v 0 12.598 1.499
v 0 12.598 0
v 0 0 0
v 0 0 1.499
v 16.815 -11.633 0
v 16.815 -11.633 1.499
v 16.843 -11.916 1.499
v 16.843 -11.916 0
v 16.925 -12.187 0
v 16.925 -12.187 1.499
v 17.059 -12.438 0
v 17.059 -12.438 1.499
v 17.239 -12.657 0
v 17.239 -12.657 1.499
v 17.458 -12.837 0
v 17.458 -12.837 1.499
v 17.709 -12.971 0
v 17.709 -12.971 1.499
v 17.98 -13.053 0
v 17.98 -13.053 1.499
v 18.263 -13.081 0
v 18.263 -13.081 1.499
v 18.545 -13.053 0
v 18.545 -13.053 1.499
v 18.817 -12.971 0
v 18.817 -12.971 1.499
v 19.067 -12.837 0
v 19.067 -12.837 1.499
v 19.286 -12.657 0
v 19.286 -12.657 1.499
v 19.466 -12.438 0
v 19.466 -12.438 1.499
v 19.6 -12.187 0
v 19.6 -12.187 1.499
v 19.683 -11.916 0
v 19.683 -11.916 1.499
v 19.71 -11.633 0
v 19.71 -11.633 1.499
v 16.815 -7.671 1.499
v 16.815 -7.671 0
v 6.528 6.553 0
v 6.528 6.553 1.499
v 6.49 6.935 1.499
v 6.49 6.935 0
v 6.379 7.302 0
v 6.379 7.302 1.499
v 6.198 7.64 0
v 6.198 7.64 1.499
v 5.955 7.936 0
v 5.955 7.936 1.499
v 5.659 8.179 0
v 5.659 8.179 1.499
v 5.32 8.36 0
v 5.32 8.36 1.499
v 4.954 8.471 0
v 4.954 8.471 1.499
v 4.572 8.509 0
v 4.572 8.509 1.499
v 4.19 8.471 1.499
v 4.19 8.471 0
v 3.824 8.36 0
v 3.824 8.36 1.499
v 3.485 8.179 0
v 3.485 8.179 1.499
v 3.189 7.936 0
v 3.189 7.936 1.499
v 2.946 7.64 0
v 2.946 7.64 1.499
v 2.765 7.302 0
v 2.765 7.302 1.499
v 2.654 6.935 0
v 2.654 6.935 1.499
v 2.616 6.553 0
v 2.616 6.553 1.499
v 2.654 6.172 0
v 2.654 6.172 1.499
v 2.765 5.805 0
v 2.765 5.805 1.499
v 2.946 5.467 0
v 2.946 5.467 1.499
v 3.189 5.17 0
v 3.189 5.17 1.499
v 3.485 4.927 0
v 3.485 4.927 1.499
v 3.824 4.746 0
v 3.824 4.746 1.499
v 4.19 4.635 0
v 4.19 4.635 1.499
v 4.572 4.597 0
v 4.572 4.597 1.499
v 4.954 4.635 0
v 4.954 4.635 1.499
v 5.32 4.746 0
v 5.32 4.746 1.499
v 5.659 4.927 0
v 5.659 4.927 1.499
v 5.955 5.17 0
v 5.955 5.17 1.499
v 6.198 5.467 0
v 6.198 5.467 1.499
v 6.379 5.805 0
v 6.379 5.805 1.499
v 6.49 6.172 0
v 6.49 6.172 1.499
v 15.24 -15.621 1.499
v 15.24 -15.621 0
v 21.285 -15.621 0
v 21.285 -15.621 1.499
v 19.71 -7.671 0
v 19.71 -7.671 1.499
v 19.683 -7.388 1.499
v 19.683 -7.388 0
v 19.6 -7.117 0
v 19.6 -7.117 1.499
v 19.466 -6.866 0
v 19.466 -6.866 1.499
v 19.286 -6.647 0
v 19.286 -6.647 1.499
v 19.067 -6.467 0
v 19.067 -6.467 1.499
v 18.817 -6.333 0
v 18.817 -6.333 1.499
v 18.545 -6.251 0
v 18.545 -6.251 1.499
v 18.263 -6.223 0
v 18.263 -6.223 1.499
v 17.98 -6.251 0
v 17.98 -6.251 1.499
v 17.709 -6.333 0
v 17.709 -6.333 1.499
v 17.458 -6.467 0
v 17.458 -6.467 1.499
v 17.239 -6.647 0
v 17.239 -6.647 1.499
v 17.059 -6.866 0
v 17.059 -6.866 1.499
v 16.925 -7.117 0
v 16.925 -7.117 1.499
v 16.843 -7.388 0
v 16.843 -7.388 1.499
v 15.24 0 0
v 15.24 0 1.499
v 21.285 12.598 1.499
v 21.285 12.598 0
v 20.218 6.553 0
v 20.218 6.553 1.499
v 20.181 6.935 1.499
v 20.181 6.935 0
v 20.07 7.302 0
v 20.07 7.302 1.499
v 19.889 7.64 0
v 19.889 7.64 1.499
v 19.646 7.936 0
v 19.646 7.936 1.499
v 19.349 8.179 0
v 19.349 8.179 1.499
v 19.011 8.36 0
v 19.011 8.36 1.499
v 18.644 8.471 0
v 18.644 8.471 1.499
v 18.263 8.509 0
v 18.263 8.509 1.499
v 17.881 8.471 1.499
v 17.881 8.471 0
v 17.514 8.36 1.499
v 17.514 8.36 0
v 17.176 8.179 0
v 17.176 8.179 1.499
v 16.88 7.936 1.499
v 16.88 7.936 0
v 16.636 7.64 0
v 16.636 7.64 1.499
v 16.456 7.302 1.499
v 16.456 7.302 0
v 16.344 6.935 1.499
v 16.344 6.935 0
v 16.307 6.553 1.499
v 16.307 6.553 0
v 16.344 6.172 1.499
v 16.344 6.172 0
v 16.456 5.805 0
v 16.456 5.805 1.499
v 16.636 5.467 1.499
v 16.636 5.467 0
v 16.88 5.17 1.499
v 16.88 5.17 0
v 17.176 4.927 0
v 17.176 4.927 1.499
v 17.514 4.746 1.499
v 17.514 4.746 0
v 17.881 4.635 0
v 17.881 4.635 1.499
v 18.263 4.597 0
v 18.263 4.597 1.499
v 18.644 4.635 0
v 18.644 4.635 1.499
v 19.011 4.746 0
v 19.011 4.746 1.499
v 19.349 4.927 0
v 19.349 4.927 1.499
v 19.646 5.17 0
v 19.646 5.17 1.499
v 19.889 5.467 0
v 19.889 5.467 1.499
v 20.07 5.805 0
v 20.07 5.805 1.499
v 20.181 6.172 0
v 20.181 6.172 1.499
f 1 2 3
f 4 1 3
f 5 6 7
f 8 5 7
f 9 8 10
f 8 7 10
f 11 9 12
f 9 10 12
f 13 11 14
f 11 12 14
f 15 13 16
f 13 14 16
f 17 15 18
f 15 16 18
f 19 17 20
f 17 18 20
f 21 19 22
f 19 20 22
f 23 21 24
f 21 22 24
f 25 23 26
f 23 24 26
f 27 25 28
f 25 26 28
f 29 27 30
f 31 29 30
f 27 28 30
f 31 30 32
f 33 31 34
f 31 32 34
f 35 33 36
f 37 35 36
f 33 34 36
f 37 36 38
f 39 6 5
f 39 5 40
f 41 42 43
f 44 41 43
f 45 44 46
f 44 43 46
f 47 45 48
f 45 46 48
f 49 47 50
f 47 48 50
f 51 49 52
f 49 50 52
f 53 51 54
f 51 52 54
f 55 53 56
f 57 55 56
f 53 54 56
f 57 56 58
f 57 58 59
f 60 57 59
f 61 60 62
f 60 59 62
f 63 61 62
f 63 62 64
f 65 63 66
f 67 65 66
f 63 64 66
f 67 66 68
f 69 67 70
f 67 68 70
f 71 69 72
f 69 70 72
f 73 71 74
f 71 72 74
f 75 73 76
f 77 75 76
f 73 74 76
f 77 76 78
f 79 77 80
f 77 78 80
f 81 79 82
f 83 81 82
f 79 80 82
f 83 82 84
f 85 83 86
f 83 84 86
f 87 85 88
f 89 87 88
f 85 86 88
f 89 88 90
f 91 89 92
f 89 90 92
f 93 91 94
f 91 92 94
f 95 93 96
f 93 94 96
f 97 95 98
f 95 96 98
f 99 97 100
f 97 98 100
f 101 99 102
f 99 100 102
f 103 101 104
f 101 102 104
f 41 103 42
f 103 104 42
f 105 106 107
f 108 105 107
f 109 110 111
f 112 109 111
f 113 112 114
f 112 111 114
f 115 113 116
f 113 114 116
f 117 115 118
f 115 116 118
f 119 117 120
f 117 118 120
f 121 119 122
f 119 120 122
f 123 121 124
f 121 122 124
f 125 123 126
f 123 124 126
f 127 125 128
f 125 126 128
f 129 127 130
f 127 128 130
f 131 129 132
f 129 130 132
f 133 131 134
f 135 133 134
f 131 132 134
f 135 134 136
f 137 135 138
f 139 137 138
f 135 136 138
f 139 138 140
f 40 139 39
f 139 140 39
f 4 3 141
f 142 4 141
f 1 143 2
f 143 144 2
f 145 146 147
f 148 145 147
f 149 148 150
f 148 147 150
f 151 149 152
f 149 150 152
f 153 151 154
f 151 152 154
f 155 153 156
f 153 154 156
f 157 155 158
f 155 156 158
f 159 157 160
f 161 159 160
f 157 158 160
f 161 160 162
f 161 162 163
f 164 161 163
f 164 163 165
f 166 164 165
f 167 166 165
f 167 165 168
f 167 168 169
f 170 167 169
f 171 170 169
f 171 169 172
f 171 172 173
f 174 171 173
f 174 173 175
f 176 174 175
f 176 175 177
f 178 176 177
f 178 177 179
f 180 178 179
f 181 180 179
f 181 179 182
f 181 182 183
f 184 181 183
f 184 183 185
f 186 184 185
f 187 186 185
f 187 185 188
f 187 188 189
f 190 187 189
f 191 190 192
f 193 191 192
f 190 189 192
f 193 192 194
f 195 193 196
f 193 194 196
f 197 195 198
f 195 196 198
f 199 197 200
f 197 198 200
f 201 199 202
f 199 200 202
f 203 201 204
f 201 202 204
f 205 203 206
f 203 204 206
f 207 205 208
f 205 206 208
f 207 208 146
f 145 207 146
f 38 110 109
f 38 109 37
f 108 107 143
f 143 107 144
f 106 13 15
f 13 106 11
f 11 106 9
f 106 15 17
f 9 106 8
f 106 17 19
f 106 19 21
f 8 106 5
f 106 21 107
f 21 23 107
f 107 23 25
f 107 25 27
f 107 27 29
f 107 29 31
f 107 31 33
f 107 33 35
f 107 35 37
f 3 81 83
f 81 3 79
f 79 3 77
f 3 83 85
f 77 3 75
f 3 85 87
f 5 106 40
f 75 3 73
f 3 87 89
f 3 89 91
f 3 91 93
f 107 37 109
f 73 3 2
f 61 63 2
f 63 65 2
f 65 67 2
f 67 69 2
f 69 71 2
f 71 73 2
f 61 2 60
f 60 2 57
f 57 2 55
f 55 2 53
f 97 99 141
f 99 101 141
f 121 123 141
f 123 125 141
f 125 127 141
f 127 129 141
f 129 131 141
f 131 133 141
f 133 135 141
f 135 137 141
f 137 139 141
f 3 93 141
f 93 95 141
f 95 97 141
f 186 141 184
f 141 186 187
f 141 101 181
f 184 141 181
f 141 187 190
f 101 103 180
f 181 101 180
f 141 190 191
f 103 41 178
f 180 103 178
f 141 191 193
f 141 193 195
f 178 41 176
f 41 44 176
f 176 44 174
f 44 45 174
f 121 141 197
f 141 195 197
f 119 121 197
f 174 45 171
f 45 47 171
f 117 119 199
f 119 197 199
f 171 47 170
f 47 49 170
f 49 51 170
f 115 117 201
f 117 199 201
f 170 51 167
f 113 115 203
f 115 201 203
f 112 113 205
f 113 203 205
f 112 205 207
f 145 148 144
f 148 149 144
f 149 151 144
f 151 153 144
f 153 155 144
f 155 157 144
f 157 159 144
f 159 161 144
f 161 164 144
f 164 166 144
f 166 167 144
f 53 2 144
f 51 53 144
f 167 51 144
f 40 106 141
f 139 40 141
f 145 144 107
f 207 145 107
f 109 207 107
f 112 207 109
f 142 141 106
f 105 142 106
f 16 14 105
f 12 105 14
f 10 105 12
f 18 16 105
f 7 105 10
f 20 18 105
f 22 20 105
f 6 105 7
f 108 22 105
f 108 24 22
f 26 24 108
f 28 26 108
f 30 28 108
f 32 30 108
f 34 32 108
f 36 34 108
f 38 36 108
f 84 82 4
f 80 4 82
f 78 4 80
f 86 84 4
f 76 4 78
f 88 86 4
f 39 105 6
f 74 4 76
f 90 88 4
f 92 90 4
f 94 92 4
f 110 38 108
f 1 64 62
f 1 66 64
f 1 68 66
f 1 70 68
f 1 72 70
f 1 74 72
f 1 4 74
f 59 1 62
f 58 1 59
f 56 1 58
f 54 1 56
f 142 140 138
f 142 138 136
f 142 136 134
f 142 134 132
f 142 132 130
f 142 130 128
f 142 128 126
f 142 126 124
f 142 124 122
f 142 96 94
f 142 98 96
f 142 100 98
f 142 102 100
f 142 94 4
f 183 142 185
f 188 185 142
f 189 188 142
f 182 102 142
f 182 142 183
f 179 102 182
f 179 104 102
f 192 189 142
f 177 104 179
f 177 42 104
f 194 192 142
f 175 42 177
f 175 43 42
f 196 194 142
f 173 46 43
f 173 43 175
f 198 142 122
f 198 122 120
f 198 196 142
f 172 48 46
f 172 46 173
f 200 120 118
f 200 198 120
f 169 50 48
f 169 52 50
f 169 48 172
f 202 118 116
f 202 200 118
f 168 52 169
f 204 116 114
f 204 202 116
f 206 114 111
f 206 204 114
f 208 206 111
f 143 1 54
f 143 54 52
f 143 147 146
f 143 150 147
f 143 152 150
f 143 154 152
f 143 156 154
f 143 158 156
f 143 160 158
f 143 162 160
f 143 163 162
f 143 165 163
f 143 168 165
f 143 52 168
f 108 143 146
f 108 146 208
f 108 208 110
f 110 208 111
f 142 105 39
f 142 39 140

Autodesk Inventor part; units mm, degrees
ref_plane "YZ Plane" through (0, 0, 0) normal (1, 0, 0) x (0, 1, 0)
ref_plane "XZ Plane" through (0, 0, 0) normal (0, 1, 0) x (-1, 0, 0)
ref_plane "XY Plane" through (0, 0, 0) normal (0, 0, 1) x (1, 0, 0)
sketch "Sketch1" plane through (0, 0, 0) normal (0, 0, 1) x (1, 0, 0)
  line L0 (0, 0) -> (15.24, 0)
  line L1 (21.2852, 0) -> (21.2852, 12.5984)
  line L2 (21.2852, 12.5984) -> (0, 12.5984)
  line L3 (0, 12.5984) -> (0, 0)
  line L4 (15.24, 0) -> (15.24, -15.621)
  line L5 (15.24, -15.621) -> (21.2852, -15.621)
  line L6 (21.2852, -15.621) -> (21.2852, 0)
  line L7 (0, 0) -> (15.24, 0)
  dimension "d0" = 21.2852
  dimension "d1" = 12.5984
  dimension "d2" = 6.0452
  dimension "d3" = 15.621
extrude "Extrusion1" add sketch "Sketch1" along normal blind 1.4986
sketch "Sketch2" plane through (0, 0, 1.4986) normal (0, 0, 1) x (1, 0, 0)
  circle A0 centre (4.572, 6.5532) radius 1.9558
  line L0 (21.2852, 12.5984) -> (0, 12.5984) projected
  line L1 (0, 12.5984) -> (0, 0) projected
  circle A1 centre (18.2626, 6.5532) radius 1.9558
  dimension "d6" = 3.9116
  dimension "d7" = 6.0452
  dimension "d8" = 4.572
  dimension "d11" = 13.6906
extrude "Extrusion2" cut sketch "Sketch2" against normal blind 25.4
sketch "Sketch3" plane through (0, 0, 1.4986) normal (0, 0, 1) x (1, 0, 0)
  circle A0 centre (18.2626, -11.6332) radius 1.4478
  line L0 (15.24, -15.621) -> (21.2852, -15.621) projected
  line L1 (15.24, 0) -> (15.24, -15.621) projected
  circle A1 centre (18.2626, -7.6708) radius 1.4478
  line L2 (16.8148, -7.6708) -> (18.2626, -7.6708)
  line L3 (19.7104, -11.6332) -> (17.1196, -11.6332)
  point P0 (0, 0)
  dimension "d18" = 2.8956
  dimension "d19" = 3.9878
  dimension "d20" = 3.0226
  dimension "d26" = 3.9624
extrude "Extrusion4" cut sketch "Sketch3" against normal blind 25.4
sketch "Sketch6" plane through (0, 0, 1.4986) normal (0, 0, 1) x (1, 0, 0)
  circle A0 centre (18.2626, -7.6708) radius 1.4478 projected
  circle A1 centre (18.2626, -11.6332) radius 1.4478 projected
  line L0 (16.8148, -7.6708) -> (19.7104, -7.6708)
  line L1 (19.7104, -7.6708) -> (19.7104, -11.6332)
  line L2 (19.7104, -11.6332) -> (16.8148, -11.6332)
  line L3 (16.8148, -11.6332) -> (16.8148, -7.6708)
  point P0 (0, 0)
extrude "Extrusion5" cut sketch "Sketch6" against normal blind 25.4 contours L1 A1 L3 A0 | A0 L0 | L2 A1 picked at (18.2044, -8.1499) picked at (18.4337, -11.182)
equation "\"BendRadius\" = Thickness"
equation "\"BendReliefWidth\" = Thickness"
equation "\"BendReliefDepth\" = 0.5 * Thickness"
equation "\"CornerReliefSize\" = 4 * Thickness"
equation "\"MinimumRemnant\" = 2 * Thickness"
equation "\"TransitionRadius\" = BendRadius"
equation "\"JacobiRadiusSize\" = Thickness"
equation "\"GapSize\" = Thickness"
equation "\"Thickness\" = 3.048"
properties part number "dsub37bracket_redraw"
